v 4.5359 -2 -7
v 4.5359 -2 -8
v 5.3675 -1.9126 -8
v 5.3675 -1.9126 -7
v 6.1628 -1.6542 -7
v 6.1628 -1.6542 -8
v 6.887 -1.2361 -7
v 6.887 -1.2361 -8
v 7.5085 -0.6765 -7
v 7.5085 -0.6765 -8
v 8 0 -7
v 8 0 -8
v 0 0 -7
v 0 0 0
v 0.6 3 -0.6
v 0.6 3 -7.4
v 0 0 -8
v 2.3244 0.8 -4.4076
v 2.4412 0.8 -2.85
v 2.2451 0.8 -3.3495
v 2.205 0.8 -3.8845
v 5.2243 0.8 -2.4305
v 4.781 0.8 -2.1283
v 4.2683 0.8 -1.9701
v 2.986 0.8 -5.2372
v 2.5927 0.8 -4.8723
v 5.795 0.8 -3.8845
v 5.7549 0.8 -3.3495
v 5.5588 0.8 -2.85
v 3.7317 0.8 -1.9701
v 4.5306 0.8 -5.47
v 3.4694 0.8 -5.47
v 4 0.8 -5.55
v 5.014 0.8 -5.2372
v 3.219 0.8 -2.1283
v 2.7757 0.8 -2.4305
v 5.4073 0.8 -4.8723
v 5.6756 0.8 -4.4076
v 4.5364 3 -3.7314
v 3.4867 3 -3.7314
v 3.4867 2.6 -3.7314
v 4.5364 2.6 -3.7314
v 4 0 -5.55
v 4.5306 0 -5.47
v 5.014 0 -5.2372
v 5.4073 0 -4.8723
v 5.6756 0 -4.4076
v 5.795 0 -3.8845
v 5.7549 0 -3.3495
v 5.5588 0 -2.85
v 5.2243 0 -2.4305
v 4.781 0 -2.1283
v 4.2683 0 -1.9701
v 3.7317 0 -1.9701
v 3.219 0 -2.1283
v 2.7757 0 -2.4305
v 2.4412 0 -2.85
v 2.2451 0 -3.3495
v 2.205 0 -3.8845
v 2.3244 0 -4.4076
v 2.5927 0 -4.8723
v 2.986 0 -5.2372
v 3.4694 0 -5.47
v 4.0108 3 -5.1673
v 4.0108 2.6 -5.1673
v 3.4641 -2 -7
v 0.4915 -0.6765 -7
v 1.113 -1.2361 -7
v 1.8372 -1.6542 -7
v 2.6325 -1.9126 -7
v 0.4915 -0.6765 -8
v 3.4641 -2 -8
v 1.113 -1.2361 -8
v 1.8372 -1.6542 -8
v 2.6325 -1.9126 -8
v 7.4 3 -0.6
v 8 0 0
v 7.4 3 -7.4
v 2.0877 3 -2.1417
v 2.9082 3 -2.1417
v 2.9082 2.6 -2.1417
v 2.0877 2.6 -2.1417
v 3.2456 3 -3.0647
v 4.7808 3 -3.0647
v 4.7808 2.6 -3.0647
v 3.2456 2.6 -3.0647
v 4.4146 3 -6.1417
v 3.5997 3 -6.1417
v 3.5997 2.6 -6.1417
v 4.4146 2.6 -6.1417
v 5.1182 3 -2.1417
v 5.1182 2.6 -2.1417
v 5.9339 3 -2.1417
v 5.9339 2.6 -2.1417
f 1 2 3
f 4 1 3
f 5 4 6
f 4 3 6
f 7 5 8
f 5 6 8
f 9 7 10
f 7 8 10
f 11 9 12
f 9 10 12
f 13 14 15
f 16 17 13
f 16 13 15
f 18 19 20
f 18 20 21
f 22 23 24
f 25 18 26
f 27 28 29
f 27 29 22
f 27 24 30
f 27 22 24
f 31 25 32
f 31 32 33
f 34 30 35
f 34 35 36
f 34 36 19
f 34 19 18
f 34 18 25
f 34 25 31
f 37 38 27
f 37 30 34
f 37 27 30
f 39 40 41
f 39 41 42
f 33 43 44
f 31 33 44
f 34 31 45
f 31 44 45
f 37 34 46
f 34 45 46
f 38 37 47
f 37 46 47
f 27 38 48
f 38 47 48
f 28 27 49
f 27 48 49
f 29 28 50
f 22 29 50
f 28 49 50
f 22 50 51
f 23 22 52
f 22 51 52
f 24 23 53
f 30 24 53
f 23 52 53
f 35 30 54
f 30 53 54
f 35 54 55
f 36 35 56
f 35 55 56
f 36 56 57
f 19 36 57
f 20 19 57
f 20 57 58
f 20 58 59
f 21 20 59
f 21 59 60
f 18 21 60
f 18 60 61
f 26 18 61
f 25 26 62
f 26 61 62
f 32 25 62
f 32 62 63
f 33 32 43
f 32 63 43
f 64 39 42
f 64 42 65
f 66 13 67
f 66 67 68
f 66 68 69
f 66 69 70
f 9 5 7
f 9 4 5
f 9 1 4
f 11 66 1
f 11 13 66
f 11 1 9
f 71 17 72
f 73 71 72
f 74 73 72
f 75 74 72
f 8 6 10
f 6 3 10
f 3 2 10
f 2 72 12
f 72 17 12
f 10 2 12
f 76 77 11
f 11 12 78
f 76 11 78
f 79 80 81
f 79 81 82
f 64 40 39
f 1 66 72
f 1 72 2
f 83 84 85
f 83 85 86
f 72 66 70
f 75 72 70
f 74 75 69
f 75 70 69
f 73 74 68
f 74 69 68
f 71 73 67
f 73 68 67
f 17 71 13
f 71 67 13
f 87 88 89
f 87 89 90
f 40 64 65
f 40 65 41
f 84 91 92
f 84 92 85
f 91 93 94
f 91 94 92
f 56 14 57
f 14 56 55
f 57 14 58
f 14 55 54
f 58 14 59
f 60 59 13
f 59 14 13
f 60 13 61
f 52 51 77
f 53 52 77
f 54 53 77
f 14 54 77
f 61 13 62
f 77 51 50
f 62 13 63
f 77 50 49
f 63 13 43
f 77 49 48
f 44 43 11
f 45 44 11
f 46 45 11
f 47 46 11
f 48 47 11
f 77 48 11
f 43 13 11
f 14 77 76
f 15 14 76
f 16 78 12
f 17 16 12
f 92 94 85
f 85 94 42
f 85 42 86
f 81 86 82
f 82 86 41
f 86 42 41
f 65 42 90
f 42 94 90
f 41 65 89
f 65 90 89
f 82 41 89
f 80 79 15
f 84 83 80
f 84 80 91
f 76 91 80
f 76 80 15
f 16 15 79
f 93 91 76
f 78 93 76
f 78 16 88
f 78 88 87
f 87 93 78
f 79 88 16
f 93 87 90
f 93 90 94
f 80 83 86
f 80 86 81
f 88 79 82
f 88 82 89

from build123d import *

# Parameters (mm, degrees)
SKETCH1_W               = 8
SKETCH1_H               = 8
BOSS_EXTRUDE1_DEPTH     = 3
CUT_EXTRUDE1_DEPTH      = 12.704699911
CUT_EXTRUDE1_DEPTH_BACK = 12.704699911
CUT_EXTRUDE2_DEPTH      = 11
SKETCH4_R               = 1.8
CUT_EXTRUDE3_DEPTH      = 0.8
SKETCH5_W               = 8
SKETCH5_H               = 1
BOSS_EXTRUDE2_DEPTH     = 2
FILLET1_R               = 4
CUT_EXTRUDE4_DEPTH      = 0.4


with BuildPart() as part:
    # Sketch1 → Boss-Extrude1 (new body)
    with BuildSketch(Plane(origin=(0, 0, 0), x_dir=(1, 0, 0), z_dir=(0, 1, 0))):
        with Locations((4, 4)):
            Rectangle(SKETCH1_W, SKETCH1_H)
    extrude(amount=BOSS_EXTRUDE1_DEPTH)

    # Sketch2 → Cut-Extrude1 (cut, two sides: drawn at the far end of the back side and taken through both)
    with BuildSketch(Plane.XY.offset(-CUT_EXTRUDE1_DEPTH_BACK)):
        Polygon((0, 0), (0.6, 3), (0, 3), align=None)
        Polygon((8, 0), (7.4, 3), (8, 3), align=None)
    extrude(amount=CUT_EXTRUDE1_DEPTH + CUT_EXTRUDE1_DEPTH_BACK, mode=Mode.SUBTRACT)

    # Sketch3 → Cut-Extrude2 (cut)
    with BuildSketch(Plane(origin=(0, 0, 0), x_dir=(0, 0, -1), z_dir=(1, 0, 0))):
        Polygon((0, 0), (0.6, 3), (0, 3), align=None)
        Polygon((8, 3), (7.4, 3), (8, 0), align=None)
    extrude(amount=CUT_EXTRUDE2_DEPTH, mode=Mode.SUBTRACT)

    # Sketch4 → Cut-Extrude3 (cut)
    with BuildSketch(Plane.XZ):
        with Locations(Location((4, -3.75, 0), (0, 0, 270))):
            Circle(SKETCH4_R)
    extrude(amount=-CUT_EXTRUDE3_DEPTH, mode=Mode.SUBTRACT)

    # Sketch5 → Boss-Extrude2 (add)
    with BuildSketch(Plane.XZ):
        with Locations((4, -7.5)):
            Rectangle(SKETCH5_W, SKETCH5_H)
    extrude(amount=BOSS_EXTRUDE2_DEPTH)

    # Fillet1
    # the kernel refuses this fillet: 4 mm, written as the material it takes off along each edge
    with BuildSketch(Plane(origin=(8, -2, -16.660254038), x_dir=(0, 1, 0), z_dir=(0, 0, 1)), Plane(origin=(0, -2, 1.660254038), x_dir=(0, 1, 0), z_dir=(0, 0, -1))) as fillet1_piece_1:
        with BuildLine():
            CenterArc((4, 3.464101615), FILLET1_R, 180, 60)
            Line((0, 3.464101615), (-0.08, 3.464101615))
            Line((-0.08, 3.464101615), (-0.08, 0))
            Line((-0.08, 0), (0, -0.08))
            ThreePointArc((0, -0.08), (1, -0.08), (1.96, -0.069282032))
            Line((1.96, -0.069282032), (2, 0))
        make_face()
    extrude(amount=18.320508076, mode=Mode.SUBTRACT)

    # Sketch6 → Cut-Extrude4 (cut)
    with BuildSketch(Plane(origin=(0, 3, 0), x_dir=(1, 0, 0), z_dir=(0, 1, 0))):
        Polygon((5.933857302, 2.141652068), (5.118152174, 2.141652068), (4.780812431, 3.064728992), (3.24555602, 3.064728992), (2.908216277, 2.141652068), (2.087703456, 2.141652068), (3.599722687, 6.141652068), (4.414626533, 6.141652068), align=None)
        Polygon((4.536421405, 3.731395658), (4.010780379, 5.167293094), (3.486741918, 3.731395658), align=None, mode=Mode.SUBTRACT)
    extrude(amount=-CUT_EXTRUDE4_DEPTH, mode=Mode.SUBTRACT)


solid = part.part
